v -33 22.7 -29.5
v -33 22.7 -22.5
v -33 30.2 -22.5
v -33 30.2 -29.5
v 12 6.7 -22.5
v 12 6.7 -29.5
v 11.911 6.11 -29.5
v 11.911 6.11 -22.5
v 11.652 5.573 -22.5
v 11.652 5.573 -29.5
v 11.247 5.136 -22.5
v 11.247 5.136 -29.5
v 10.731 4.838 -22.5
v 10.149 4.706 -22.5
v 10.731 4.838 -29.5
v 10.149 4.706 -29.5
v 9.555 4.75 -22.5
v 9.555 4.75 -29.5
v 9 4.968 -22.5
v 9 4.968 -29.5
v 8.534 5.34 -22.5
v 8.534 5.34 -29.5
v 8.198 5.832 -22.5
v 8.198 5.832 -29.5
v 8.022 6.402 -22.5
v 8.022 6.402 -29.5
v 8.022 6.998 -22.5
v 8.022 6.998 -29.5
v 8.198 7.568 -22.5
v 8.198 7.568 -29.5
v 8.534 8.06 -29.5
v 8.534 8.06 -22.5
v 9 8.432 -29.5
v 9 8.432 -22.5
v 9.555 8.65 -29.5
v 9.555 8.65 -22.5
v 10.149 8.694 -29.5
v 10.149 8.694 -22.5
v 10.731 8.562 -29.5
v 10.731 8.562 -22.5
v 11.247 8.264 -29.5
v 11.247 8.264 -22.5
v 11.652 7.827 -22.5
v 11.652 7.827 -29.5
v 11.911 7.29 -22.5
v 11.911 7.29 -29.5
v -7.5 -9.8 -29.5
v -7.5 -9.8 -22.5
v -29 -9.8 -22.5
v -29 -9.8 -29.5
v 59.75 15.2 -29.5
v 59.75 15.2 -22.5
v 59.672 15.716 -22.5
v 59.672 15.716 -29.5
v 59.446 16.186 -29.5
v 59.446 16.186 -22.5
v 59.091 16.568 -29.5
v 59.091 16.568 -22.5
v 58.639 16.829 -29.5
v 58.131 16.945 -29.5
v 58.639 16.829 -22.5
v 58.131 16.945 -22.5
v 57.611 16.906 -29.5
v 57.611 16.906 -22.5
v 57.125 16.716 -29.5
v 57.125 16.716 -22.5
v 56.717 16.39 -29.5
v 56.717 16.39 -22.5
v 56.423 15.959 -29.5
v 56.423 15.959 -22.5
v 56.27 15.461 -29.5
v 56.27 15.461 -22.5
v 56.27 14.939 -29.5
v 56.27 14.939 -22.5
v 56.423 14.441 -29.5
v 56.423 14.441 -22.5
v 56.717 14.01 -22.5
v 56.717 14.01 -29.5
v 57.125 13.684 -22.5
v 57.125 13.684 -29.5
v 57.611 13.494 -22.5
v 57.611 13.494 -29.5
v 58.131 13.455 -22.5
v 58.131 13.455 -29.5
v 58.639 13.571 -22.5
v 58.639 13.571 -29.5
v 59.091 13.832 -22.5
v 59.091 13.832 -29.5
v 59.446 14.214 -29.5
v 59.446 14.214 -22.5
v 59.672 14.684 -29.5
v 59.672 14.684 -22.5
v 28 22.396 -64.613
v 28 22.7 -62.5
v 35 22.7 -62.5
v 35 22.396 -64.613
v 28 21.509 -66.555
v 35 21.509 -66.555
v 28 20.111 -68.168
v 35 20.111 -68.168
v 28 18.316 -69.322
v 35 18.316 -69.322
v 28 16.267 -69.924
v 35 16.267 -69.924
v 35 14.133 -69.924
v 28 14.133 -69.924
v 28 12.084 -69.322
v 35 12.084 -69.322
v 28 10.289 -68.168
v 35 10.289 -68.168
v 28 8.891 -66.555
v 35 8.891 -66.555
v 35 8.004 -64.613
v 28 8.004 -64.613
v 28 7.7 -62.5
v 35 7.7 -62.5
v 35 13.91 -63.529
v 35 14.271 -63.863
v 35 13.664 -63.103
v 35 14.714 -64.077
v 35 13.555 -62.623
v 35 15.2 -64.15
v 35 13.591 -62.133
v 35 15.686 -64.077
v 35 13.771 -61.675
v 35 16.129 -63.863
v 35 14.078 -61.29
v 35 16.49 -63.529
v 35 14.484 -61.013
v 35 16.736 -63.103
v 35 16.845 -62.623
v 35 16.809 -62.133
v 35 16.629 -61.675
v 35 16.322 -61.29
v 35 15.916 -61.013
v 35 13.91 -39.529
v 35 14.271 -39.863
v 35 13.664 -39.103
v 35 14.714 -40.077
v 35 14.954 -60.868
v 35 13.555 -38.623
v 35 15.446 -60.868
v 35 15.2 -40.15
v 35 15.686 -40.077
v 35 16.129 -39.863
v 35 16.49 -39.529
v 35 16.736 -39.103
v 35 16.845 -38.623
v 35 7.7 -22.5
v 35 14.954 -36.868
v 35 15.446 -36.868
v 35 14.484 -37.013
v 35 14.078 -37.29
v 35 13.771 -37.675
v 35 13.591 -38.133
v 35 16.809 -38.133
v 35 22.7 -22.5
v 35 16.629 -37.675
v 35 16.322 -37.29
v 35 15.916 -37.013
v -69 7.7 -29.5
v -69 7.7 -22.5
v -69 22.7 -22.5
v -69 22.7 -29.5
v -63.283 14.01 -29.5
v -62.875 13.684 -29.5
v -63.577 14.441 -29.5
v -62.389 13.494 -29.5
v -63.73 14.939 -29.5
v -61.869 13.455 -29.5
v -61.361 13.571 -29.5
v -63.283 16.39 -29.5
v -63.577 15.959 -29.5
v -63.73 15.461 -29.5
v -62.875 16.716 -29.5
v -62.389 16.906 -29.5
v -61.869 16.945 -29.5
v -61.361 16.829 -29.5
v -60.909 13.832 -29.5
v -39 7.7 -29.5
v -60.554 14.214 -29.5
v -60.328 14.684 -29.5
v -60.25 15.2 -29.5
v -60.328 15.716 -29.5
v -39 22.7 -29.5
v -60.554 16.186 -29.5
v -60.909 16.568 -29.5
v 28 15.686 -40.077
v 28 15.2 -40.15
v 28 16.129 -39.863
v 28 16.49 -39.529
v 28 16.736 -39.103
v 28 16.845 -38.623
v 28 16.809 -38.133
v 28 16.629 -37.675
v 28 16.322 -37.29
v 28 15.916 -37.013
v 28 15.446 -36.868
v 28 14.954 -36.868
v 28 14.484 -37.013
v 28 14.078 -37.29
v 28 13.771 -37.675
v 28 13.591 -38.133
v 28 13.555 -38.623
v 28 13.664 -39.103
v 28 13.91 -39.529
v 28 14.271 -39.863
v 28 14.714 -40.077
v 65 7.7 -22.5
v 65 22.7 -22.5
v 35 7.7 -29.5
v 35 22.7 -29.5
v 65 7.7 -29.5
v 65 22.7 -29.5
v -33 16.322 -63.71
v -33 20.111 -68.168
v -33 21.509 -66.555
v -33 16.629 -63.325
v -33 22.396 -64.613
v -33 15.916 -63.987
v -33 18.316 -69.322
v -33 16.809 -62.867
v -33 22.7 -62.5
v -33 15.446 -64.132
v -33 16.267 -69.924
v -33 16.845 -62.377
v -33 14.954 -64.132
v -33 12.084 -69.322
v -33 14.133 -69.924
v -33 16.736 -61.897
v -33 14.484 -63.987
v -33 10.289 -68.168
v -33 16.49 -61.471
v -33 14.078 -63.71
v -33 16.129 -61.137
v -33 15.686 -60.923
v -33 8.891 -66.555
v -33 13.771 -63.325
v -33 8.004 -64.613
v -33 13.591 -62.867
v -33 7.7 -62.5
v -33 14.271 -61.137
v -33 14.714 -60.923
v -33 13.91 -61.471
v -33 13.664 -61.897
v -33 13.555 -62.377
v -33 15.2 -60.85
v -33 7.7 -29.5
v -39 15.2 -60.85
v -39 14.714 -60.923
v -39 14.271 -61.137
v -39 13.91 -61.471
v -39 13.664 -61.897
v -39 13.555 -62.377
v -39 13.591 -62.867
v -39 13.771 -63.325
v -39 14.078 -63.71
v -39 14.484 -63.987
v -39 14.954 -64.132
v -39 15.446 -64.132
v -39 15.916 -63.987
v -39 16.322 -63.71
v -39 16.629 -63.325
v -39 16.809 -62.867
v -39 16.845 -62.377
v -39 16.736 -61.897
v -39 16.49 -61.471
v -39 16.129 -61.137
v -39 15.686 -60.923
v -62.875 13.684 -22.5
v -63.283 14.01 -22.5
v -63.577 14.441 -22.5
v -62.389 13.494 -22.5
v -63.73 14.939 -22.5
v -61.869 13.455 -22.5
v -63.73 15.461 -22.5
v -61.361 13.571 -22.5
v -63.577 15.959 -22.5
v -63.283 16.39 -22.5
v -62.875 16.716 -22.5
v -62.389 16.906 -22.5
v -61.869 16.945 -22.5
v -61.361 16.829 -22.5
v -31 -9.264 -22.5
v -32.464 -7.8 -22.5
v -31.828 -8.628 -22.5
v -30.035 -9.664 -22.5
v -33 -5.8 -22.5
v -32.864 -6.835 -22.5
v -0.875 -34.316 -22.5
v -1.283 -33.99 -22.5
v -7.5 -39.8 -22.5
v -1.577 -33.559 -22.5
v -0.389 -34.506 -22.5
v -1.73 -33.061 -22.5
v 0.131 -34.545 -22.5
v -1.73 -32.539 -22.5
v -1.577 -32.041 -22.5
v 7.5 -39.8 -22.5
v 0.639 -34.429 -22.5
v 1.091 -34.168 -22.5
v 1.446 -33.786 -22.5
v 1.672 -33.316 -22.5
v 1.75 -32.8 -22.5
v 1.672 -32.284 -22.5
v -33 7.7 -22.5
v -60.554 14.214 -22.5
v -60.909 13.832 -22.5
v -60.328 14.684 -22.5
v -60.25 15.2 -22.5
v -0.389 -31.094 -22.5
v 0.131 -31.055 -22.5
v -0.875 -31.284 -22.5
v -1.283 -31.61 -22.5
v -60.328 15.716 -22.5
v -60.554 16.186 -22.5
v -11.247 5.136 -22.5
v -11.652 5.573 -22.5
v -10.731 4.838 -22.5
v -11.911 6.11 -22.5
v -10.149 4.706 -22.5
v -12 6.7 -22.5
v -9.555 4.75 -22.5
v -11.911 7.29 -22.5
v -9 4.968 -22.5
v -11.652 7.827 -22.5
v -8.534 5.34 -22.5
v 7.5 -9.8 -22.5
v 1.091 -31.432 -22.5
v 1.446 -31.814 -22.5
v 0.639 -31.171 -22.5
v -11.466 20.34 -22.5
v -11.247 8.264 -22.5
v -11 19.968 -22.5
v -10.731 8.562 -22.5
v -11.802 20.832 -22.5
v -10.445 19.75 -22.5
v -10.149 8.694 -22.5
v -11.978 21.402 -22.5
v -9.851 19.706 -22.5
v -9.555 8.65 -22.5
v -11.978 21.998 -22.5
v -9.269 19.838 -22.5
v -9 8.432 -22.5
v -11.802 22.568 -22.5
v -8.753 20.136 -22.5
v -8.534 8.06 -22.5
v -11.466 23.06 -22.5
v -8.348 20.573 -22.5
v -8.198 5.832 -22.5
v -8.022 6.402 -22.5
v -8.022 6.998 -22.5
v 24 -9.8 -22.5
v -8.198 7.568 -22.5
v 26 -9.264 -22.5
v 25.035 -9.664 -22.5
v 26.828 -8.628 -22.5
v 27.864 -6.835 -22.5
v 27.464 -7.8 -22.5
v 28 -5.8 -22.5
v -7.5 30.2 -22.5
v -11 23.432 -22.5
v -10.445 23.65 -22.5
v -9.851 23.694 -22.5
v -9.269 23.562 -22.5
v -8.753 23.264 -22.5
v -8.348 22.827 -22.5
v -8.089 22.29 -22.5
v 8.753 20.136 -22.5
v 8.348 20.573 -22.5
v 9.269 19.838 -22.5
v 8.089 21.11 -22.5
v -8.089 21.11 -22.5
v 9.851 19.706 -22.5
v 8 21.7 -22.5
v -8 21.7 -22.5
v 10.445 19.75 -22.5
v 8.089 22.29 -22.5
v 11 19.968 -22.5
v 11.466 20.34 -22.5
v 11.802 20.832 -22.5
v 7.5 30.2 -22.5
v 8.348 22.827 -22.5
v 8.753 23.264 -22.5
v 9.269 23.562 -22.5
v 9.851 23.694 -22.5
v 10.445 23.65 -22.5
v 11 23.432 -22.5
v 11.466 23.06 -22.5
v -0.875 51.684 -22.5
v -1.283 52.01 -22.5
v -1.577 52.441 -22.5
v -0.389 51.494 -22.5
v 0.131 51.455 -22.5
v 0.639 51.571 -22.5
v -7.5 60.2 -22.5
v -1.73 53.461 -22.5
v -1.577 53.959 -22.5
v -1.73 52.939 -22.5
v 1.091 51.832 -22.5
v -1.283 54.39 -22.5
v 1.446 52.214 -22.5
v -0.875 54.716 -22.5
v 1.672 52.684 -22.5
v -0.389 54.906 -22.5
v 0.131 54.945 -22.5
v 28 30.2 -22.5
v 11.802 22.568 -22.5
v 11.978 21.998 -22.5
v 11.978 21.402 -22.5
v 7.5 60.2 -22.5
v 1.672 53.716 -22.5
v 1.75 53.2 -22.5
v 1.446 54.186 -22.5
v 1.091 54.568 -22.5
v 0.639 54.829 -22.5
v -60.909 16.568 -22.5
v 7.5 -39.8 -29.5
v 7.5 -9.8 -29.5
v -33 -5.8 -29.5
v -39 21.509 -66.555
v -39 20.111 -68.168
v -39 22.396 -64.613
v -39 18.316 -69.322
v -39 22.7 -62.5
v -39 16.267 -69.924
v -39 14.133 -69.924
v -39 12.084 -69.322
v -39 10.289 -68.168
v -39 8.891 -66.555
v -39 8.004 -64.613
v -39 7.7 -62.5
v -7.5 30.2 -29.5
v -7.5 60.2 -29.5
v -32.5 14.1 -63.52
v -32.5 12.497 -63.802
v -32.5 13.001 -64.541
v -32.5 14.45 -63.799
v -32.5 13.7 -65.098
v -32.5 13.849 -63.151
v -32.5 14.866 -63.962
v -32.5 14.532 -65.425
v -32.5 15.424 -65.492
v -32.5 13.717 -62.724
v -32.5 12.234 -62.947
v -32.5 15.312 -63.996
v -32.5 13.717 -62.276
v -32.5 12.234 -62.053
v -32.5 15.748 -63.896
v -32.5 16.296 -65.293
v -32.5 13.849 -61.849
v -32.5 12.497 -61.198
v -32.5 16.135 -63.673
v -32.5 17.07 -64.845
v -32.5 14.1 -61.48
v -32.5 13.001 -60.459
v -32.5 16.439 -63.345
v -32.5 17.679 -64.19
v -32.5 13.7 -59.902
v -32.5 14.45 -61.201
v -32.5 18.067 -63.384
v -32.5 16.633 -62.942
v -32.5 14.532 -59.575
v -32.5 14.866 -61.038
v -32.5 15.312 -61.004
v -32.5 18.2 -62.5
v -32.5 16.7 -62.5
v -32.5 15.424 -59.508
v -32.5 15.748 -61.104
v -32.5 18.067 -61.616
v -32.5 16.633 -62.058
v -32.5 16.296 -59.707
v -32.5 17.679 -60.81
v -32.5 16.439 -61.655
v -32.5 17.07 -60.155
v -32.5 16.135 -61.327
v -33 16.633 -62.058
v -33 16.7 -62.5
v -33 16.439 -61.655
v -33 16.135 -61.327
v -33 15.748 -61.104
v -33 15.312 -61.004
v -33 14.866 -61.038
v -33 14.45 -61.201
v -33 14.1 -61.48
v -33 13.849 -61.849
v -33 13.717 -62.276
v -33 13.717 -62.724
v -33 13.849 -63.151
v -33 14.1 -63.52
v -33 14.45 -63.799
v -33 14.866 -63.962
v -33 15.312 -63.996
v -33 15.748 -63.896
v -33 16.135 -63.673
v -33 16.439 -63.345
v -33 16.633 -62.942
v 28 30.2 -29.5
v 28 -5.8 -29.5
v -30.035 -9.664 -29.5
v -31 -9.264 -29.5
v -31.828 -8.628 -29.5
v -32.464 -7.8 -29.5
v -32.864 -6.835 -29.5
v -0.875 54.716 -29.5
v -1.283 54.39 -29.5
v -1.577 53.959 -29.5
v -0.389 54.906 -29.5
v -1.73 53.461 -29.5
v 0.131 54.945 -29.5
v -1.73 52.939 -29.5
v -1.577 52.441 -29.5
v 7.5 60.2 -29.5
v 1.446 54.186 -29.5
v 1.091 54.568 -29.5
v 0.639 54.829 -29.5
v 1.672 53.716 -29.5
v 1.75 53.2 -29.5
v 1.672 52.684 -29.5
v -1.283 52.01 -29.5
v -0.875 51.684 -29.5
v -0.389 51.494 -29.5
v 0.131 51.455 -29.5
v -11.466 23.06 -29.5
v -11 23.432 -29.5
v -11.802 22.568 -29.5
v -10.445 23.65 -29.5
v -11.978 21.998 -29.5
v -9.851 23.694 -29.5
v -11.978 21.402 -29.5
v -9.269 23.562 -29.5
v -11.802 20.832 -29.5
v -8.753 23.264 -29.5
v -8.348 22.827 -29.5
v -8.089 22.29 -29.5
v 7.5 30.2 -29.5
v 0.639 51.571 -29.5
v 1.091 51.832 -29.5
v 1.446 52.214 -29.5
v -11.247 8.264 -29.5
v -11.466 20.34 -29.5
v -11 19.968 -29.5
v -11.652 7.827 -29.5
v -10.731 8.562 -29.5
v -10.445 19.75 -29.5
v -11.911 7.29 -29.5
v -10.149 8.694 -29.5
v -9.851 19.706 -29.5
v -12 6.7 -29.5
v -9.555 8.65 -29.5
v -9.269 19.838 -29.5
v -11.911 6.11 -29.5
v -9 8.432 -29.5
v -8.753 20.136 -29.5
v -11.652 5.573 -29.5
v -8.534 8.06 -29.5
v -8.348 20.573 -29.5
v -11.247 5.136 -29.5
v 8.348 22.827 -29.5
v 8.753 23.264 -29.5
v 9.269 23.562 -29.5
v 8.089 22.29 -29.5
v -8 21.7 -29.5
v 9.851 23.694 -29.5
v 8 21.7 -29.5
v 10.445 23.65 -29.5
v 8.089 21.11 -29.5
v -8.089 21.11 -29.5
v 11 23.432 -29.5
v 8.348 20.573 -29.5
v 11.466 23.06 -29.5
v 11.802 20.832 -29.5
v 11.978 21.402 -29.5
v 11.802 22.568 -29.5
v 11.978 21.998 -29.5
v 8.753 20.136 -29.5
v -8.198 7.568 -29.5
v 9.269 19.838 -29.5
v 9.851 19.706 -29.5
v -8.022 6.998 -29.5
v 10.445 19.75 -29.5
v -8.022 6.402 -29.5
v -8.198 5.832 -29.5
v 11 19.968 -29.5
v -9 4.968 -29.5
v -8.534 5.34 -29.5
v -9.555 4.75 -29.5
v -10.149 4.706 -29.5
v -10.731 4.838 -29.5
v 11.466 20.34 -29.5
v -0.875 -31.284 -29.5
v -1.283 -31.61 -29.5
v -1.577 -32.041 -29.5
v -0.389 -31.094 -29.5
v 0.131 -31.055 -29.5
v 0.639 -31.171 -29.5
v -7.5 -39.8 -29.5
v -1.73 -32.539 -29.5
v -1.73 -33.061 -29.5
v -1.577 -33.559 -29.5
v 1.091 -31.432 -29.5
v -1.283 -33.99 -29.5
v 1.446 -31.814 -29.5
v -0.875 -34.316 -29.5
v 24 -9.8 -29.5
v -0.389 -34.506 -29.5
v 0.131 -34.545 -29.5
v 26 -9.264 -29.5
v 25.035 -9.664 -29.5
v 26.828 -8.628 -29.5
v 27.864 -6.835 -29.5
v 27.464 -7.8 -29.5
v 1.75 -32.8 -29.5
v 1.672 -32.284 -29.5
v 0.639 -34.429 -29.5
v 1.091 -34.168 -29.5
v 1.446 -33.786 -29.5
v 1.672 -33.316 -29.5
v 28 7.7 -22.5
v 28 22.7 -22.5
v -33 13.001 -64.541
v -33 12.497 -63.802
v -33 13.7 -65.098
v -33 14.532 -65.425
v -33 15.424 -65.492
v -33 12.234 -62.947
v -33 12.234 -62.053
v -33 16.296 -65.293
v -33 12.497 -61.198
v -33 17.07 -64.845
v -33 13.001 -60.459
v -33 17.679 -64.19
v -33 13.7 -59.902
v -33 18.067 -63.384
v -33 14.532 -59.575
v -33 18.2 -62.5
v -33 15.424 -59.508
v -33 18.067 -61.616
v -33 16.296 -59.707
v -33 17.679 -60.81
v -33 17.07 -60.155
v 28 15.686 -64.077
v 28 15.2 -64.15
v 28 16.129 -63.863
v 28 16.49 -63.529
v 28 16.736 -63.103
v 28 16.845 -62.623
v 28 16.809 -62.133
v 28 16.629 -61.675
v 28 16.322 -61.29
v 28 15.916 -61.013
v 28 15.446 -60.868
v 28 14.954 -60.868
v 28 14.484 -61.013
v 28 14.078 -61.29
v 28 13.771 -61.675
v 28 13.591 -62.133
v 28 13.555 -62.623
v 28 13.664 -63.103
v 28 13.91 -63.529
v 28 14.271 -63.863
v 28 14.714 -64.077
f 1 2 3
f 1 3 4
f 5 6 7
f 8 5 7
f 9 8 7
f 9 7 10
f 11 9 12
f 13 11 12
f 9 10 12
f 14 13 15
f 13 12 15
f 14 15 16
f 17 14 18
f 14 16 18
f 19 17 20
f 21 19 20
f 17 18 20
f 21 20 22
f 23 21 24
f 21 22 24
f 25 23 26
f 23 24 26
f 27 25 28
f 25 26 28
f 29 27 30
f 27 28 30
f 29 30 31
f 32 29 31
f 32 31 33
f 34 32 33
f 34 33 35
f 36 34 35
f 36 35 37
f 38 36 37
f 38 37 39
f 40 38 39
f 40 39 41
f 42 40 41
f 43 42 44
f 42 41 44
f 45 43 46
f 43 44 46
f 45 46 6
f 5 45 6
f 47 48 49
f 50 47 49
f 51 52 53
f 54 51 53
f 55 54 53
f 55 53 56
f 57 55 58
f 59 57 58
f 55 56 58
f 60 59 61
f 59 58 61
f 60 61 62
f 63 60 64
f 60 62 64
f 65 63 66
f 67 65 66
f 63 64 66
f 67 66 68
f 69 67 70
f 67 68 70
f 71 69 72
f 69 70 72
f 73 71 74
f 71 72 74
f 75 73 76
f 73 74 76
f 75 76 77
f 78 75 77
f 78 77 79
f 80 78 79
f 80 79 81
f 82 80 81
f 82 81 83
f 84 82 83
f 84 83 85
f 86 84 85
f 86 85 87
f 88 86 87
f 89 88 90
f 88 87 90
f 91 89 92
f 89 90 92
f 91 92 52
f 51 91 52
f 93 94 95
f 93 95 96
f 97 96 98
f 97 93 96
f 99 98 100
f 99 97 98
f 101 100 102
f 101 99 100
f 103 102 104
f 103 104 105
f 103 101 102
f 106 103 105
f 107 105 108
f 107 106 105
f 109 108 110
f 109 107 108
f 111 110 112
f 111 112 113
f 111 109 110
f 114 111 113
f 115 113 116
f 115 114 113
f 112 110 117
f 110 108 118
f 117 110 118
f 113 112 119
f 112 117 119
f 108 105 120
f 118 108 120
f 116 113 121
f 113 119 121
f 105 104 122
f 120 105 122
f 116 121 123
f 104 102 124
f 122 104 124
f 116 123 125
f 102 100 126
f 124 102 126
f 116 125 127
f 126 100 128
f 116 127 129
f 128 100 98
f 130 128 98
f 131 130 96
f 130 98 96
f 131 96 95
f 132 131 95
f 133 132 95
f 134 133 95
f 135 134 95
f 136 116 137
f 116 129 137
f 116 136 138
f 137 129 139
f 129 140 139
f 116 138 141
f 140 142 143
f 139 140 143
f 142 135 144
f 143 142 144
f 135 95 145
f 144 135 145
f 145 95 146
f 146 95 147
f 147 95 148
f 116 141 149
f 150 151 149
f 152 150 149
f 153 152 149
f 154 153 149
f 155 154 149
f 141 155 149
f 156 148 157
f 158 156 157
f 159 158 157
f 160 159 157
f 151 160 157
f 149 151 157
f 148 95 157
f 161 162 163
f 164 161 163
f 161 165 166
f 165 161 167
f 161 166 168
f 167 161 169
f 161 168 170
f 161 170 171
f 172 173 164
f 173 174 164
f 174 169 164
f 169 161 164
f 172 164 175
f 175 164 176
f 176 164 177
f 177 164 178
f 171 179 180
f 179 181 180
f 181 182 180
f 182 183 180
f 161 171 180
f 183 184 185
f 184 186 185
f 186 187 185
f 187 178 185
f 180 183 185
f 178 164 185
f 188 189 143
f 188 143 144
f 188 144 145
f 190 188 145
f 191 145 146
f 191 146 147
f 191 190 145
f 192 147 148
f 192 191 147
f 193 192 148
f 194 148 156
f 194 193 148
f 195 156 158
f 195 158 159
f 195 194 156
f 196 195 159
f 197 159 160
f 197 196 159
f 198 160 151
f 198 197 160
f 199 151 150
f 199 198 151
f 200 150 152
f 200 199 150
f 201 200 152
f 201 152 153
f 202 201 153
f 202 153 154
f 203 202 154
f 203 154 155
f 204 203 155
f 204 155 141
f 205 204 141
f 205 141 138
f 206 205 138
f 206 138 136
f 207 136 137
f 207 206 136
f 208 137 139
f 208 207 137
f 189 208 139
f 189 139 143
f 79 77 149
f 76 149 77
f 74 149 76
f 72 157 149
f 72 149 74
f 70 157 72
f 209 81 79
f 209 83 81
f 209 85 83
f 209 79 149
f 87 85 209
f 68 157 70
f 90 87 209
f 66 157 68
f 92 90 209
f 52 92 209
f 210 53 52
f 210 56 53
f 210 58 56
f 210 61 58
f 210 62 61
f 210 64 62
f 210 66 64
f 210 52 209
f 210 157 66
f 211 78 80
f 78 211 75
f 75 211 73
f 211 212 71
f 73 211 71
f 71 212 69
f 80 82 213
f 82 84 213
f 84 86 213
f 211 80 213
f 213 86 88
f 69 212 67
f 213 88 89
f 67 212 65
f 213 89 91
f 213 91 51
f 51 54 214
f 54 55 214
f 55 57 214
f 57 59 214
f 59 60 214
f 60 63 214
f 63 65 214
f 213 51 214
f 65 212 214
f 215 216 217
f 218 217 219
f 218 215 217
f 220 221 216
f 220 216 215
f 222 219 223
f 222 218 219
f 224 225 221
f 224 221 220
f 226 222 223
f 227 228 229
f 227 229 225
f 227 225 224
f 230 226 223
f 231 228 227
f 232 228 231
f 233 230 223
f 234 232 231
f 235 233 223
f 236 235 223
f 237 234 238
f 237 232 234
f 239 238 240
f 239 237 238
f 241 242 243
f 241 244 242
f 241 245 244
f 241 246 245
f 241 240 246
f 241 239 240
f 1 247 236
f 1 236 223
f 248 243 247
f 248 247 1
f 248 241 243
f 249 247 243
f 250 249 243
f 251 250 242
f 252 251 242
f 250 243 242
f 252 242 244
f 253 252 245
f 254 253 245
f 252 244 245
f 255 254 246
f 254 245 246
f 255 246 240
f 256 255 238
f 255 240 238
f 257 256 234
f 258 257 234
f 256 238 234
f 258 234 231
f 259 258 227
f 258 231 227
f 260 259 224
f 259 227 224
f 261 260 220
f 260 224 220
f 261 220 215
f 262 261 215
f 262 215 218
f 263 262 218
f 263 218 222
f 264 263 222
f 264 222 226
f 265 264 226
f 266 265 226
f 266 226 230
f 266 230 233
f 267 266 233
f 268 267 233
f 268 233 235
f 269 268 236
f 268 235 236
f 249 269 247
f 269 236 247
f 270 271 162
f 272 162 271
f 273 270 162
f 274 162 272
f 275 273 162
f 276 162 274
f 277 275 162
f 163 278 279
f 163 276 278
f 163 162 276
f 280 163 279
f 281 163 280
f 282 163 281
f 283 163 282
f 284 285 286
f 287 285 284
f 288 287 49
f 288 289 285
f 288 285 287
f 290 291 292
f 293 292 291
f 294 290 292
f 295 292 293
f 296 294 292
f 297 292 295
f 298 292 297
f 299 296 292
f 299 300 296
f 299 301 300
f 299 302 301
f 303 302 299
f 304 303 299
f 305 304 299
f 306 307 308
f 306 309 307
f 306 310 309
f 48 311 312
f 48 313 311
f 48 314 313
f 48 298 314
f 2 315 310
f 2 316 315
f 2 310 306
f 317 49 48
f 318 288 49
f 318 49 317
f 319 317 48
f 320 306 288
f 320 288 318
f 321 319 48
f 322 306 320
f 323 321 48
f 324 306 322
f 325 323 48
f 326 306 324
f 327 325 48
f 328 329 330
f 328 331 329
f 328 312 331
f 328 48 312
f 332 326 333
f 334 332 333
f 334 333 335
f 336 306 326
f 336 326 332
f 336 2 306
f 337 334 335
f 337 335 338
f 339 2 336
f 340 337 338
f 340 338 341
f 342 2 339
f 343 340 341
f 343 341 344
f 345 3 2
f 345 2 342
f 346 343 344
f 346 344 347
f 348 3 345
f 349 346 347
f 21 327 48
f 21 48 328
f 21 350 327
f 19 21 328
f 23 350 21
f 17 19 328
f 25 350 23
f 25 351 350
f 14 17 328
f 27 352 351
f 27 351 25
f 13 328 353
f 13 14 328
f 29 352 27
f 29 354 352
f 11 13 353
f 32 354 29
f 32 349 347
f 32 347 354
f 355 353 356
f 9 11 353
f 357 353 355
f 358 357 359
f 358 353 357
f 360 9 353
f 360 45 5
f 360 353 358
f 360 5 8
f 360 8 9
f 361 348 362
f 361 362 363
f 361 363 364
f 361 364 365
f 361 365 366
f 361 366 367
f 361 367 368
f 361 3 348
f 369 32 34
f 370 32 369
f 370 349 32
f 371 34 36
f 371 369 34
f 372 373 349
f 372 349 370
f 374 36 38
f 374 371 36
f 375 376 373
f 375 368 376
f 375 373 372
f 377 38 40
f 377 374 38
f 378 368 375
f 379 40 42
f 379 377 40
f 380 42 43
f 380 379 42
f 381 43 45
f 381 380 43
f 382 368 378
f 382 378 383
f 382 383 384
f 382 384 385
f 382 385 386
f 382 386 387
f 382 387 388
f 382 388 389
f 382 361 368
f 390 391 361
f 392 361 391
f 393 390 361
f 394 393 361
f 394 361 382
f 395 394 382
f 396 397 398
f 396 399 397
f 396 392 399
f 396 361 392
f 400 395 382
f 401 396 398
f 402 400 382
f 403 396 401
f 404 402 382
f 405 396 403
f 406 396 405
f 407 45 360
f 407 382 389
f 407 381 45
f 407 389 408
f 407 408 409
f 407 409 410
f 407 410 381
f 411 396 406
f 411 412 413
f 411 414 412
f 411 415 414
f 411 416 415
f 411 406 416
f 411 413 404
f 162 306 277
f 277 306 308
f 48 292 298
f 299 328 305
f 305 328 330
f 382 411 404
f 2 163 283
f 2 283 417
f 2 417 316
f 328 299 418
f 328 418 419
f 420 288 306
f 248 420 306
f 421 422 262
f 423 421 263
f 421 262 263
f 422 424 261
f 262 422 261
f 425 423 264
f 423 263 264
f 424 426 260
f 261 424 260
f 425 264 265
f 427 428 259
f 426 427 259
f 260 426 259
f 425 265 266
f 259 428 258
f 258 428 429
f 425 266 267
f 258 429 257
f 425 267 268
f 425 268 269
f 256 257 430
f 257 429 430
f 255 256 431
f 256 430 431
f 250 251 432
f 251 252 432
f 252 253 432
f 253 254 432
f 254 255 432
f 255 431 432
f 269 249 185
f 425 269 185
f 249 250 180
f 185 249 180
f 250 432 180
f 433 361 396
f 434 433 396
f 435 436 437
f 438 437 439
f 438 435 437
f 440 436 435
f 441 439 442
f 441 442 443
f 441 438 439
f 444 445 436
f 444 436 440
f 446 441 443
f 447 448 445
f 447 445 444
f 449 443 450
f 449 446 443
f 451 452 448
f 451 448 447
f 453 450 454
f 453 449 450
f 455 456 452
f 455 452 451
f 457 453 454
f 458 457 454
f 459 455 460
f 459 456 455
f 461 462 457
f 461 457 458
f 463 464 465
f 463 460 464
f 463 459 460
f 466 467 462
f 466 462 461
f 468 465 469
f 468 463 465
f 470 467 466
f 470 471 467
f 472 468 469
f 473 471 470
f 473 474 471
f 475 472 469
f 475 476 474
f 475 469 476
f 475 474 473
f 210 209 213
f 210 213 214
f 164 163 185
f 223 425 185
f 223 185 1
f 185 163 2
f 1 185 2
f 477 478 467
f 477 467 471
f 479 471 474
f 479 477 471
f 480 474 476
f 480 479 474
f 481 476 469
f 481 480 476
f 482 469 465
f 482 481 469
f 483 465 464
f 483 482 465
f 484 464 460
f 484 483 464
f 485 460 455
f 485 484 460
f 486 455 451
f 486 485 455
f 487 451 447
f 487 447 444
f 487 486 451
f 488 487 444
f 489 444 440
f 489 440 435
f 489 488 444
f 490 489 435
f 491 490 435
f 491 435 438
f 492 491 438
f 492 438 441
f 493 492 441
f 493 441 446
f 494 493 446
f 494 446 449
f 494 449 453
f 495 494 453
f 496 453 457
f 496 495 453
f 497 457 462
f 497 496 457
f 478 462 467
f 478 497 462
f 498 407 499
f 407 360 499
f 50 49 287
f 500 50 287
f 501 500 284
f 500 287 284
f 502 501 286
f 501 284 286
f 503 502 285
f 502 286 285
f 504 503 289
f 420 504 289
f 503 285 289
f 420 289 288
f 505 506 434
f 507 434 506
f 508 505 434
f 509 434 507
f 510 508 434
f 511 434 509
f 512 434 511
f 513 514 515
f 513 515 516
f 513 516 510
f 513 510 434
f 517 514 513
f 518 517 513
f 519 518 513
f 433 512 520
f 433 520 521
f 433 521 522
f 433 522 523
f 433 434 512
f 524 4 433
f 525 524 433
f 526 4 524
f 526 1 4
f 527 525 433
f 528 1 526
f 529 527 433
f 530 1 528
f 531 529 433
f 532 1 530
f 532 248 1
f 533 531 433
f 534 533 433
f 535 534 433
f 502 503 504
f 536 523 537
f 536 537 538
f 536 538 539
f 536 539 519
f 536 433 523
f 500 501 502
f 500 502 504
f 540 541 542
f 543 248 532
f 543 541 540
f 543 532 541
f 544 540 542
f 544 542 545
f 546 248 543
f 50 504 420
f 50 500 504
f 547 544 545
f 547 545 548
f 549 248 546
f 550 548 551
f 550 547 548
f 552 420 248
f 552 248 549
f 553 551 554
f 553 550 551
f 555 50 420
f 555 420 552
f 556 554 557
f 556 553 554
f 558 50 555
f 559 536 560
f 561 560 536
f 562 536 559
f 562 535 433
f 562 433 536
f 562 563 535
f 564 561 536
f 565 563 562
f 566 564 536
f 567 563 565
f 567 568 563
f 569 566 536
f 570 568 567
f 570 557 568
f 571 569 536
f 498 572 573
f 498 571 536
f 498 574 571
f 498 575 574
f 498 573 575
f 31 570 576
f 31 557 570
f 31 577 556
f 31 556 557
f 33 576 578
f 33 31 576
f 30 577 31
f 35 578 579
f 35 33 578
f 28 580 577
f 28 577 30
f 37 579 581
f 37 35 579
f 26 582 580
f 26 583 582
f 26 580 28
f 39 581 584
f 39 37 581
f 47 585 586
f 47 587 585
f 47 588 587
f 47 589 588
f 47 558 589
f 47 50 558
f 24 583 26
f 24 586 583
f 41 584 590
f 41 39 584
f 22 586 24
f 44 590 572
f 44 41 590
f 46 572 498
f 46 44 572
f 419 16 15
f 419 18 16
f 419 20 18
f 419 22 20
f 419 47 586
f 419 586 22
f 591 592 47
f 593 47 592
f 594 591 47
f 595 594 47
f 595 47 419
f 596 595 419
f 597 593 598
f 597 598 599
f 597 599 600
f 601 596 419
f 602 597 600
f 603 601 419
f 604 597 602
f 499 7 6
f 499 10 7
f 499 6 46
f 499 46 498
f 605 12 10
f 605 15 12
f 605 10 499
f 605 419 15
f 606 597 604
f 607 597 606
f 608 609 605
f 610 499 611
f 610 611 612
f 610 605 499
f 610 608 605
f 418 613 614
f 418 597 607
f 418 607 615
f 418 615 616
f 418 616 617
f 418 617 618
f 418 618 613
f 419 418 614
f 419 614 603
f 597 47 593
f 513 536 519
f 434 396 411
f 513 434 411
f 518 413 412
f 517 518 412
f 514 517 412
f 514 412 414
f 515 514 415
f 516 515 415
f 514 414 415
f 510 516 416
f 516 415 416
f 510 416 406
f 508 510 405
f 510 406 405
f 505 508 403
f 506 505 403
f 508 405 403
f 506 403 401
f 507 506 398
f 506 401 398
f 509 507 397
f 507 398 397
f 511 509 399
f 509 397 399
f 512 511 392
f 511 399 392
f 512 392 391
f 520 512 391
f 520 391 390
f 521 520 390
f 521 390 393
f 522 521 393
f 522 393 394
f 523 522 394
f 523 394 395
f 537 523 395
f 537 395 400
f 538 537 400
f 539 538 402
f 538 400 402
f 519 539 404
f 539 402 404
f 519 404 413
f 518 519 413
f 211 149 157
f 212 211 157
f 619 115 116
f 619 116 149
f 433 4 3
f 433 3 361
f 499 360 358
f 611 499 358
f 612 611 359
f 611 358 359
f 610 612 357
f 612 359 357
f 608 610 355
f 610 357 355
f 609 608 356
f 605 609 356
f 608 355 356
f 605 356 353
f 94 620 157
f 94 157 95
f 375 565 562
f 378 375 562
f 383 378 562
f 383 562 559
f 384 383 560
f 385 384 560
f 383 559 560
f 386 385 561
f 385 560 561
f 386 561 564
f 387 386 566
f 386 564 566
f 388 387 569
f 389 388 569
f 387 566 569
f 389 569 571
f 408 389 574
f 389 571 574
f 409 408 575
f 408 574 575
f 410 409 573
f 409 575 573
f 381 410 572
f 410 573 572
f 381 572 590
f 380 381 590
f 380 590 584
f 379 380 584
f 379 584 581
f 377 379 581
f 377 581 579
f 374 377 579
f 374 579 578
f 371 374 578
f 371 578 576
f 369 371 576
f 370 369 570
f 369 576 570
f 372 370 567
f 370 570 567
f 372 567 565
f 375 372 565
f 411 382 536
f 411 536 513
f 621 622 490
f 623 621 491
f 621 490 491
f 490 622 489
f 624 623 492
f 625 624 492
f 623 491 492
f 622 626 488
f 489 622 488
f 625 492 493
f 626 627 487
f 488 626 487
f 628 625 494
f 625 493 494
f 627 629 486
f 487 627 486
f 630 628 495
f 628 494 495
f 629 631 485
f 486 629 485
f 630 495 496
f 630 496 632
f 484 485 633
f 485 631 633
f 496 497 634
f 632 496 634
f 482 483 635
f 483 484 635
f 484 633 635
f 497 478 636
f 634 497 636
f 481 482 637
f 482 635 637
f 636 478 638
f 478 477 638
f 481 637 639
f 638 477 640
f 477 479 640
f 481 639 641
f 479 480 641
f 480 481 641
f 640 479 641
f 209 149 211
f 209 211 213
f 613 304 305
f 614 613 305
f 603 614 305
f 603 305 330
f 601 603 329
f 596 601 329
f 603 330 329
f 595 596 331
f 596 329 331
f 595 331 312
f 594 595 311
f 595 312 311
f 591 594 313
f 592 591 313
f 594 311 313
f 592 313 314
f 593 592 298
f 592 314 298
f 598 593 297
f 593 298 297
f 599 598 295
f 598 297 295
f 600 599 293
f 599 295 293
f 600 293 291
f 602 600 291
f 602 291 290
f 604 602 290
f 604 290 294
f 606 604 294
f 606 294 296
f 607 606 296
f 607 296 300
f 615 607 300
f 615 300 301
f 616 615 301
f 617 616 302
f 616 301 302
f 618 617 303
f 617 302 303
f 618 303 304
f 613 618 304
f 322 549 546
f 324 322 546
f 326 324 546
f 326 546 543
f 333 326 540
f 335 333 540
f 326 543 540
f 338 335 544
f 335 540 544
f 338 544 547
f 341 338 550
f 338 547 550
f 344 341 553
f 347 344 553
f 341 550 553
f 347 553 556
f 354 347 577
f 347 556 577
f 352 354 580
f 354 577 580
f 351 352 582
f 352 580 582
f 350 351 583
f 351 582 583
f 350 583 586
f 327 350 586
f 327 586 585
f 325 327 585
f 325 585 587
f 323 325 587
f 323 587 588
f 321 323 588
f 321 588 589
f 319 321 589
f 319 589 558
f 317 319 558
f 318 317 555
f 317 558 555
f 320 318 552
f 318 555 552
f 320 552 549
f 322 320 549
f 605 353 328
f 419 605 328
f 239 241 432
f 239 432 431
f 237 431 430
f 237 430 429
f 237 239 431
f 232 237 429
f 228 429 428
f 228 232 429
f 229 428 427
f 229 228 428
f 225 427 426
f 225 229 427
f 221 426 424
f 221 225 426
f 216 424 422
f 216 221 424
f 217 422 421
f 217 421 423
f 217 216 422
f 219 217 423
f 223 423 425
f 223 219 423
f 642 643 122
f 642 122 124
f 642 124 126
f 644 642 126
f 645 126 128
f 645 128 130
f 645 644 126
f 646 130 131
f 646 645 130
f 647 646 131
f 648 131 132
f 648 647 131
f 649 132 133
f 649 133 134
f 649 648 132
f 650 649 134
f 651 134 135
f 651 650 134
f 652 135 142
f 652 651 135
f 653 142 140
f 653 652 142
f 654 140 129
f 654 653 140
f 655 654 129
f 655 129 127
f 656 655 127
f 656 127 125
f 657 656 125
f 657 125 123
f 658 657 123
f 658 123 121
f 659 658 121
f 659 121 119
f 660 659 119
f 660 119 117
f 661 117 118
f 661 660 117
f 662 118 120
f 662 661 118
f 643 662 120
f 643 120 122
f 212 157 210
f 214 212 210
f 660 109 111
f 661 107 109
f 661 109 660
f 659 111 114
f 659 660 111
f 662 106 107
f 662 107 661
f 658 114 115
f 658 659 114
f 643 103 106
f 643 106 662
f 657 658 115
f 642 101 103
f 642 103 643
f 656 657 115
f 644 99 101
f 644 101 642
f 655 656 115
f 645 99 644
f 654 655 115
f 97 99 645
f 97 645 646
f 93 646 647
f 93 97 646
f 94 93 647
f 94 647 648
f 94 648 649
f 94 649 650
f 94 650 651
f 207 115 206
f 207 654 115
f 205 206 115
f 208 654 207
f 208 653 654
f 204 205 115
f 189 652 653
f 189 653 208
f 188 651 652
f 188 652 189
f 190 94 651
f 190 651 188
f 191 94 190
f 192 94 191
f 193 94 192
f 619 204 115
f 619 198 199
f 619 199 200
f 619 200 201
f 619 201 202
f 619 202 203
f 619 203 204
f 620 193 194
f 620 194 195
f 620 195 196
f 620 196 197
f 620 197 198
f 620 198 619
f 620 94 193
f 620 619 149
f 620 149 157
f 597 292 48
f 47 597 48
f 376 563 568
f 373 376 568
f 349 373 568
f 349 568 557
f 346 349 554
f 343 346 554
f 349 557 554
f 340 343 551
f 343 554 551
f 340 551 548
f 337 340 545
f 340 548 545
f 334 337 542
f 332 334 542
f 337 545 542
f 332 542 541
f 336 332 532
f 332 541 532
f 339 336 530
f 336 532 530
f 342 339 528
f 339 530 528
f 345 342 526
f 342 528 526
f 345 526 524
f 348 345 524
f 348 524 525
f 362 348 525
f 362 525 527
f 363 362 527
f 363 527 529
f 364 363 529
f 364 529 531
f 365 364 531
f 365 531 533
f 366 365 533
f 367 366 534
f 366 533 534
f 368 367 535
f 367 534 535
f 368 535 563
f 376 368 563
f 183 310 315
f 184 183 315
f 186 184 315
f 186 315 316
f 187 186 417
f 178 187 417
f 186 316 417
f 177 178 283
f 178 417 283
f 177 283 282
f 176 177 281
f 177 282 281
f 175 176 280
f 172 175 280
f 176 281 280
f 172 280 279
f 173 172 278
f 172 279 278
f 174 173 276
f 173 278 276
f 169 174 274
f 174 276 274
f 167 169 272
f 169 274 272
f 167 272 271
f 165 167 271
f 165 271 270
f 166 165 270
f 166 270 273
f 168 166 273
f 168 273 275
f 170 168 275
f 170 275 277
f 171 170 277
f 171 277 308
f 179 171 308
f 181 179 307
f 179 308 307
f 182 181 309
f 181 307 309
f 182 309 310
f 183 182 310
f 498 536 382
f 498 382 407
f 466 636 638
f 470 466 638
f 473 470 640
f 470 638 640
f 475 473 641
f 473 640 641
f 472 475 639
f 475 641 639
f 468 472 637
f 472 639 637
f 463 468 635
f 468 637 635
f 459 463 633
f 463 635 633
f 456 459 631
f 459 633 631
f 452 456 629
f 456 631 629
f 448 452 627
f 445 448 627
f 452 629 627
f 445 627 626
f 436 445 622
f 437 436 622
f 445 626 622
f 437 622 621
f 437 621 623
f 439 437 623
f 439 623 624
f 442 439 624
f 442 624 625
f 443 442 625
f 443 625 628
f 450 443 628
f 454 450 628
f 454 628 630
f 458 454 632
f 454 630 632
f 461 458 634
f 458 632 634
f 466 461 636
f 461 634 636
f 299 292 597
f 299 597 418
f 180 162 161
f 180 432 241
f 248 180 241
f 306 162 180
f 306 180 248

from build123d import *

# Parameters (mm, degrees)
EXTRUDE_START       = 24.2
SKETCH_4_W          = 61
SKETCH_4_H          = 7
EXTRUDE_1_DEPTH     = 6
SKETCH_5_W          = 40
SKETCH_5_H          = 34
SKETCH_5_R          = 2
EXTRUDE_2_DEPTH     = 7
EXTRUDE_START_2     = -9.8
SKETCH_7_R          = 4.1
EXTRUDE_3_DEPTH     = 7
EXTRUDE_START_3     = -55
SKETCH_9_R          = 1.65
EXTRUDE_4_DEPTH     = 6
EXTRUDE_START_4     = -22.5
EXTRUDE_5_DEPTH     = 7
EXTRUDE_START_5     = 28
SKETCH_14_R         = 1.65
EXTRUDE_8_DEPTH     = 7
SKETCH_17_R         = 3
SKETCH_17_R_2       = 1.5
EXTRUDE_11_DEPTH    = 0.5
SKETCH_21_W         = 15
SKETCH_21_H         = 30
SKETCH_21_R         = 1.75
SKETCH_21_W_2       = 30
SKETCH_21_H_2       = 15
EXTRUDE_12_DEPTH    = 7
SKETCH_22_W         = 40
SKETCH_22_H         = 7
CUT_EXTRUDE_1_DEPTH = 23


with BuildPart() as part:
    # 草图4 → 凸台-拉伸1 (new body)
    with BuildSketch(Plane(origin=(0, 0, 0), x_dir=(1, 0, 0), z_dir=(0, 1, 0)).offset(EXTRUDE_START)):
        with Locations((-2.5, 26)):
            Rectangle(SKETCH_4_W, SKETCH_4_H)
    extrude(amount=EXTRUDE_1_DEPTH)

    # 草图5 → 凸台-拉伸2 (add)
    with BuildSketch(Plane(origin=(0, 0, -29.5), x_dir=(-1, 0, 0), z_dir=(0, 0, -1))):
        with Locations((0, 7.2)):
            Rectangle(SKETCH_5_W, SKETCH_5_H)
        with Locations((-10, 21.7)):
            Circle(SKETCH_5_R, mode=Mode.SUBTRACT)
        with Locations(Location((10, 21.7, 0), (0, 0, 180))):
            Circle(SKETCH_5_R, mode=Mode.SUBTRACT)
        with Locations((10, 6.7)):
            Circle(SKETCH_5_R, mode=Mode.SUBTRACT)
        with Locations(Location((-10, 6.7, 0), (0, 0, 180))):
            Circle(SKETCH_5_R, mode=Mode.SUBTRACT)
    extrude(amount=-EXTRUDE_2_DEPTH)

    # 草图7 → 凸台-拉伸3 (add)
    with BuildSketch(Plane(origin=(0, 0, 0), x_dir=(1, 0, 0), z_dir=(0, 1, 0)).offset(EXTRUDE_START_2)):
        with BuildLine():
            Line((20, 22.5), (-20, 22.5))
            Line((-20, 22.5), (-20, 2.5))
            ThreePointArc((-20, 2.5), (-19.121320344, 0.378679656), (-17, -0.5))
            Line((-17, -0.5), (17, -0.5))
            ThreePointArc((17, -0.5), (19.121320344, 0.378679656), (20, 2.5))
            Line((20, 2.5), (20, 22.5))
        make_face()
        with Locations(Location((10, 10, 0), (0, 0, 90))):
            Circle(SKETCH_7_R, mode=Mode.SUBTRACT)
    extrude(amount=EXTRUDE_3_DEPTH)



with BuildPart() as body_2:
    # 草图9 → 凸台-拉伸4 (new body)
    with BuildSketch(Plane(origin=(22, 25.2, -43.868265324), x_dir=(0, 0, 1), z_dir=(1, 0, 0)).offset(EXTRUDE_START_3)):
        with BuildLine():
            Line((-18.631734676, 2.5), (21.368265324, 2.5))
            Line((21.368265324, 2.5), (21.368265324, 17.5))
            Line((21.368265324, 17.5), (-18.631734676, 17.5))
            ThreePointArc((-18.631734676, 17.5), (-26.131734676, 10), (-18.631734676, 2.5))
        make_face()
        with Locations((-18.631734676, 10)):
            Circle(SKETCH_9_R, mode=Mode.SUBTRACT)
    extrude(amount=-EXTRUDE_4_DEPTH)


with BuildPart() as part_1:
    add(part.part)

    add(body_2.part)  # 凸台-拉伸5 merges body 2
    # 草图10 → 凸台-拉伸5 (add)
    with BuildSketch(Plane.XY.offset(EXTRUDE_START_4)):
        with BuildLine():
            Line((-33, 30.2), (-20, 30.2))
            Line((-20, 30.2), (-20, -9.8))
            Line((-20, -9.8), (-29, -9.8))
            ThreePointArc((-29, -9.8), (-31.828427125, -8.628427125), (-33, -5.8))
            Line((-33, -5.8), (-33, 30.2))
        make_face()
    extrude(amount=-EXTRUDE_5_DEPTH)

    # 草图21 → 凸台-拉伸12 (add)
    # profile 1 of 5: a face of its own
    with BuildSketch(Plane.XY.offset(EXTRUDE_START_4)):
        with Locations((0, 45.2)):
            Rectangle(SKETCH_21_W, SKETCH_21_H)
        with Locations((0, 53.2)):
            Circle(SKETCH_21_R, mode=Mode.SUBTRACT)
    # profile 2 of 5: a face of its own
    with BuildSketch(Plane.XY.offset(EXTRUDE_START_4)):
        with Locations((-54, 15.2)):
            Rectangle(SKETCH_21_W_2, SKETCH_21_H_2)
        with Locations((-62, 15.2)):
            Circle(SKETCH_21_R, mode=Mode.SUBTRACT)
    # profile 3 of 5: a face of its own
    with BuildSketch(Plane.XY.offset(EXTRUDE_START_4)):
        with Locations((50, 15.2)):
            Rectangle(SKETCH_21_W_2, SKETCH_21_H_2)
        with Locations((58, 15.2)):
            Circle(SKETCH_21_R, mode=Mode.SUBTRACT)
    # profile 4 of 5: a face of its own
    with BuildSketch(Plane.XY.offset(EXTRUDE_START_4)):
        with Locations((0, -24.8)):
            Rectangle(SKETCH_21_W, SKETCH_21_H)
        with Locations((0, -32.8)):
            Circle(SKETCH_21_R, mode=Mode.SUBTRACT)
    # profile 5 of 5: a face of its own
    with BuildSketch(Plane.XY.offset(EXTRUDE_START_4)):
        with BuildLine():
            Line((20, -9.8), (20, 24.2))
            Line((20, 24.2), (28, 24.2))
            Line((28, 24.2), (28, -5.8))
            ThreePointArc((28, -5.8), (26.828427125, -8.628427125), (24, -9.8))
            Line((24, -9.8), (20, -9.8))
        make_face()
    extrude(amount=-EXTRUDE_12_DEPTH)


with BuildPart() as body_2_2:
    # 草图14 → 凸台-拉伸8 (new body)
    with BuildSketch(Plane(origin=(0, 0, 0), x_dir=(0, 0, -1), z_dir=(1, 0, 0)).offset(EXTRUDE_START_5)):
        with BuildLine():
            Line((22.5, 22.7), (62.5, 22.7))
            ThreePointArc((62.5, 22.7), (70, 15.2), (62.5, 7.7))
            Line((62.5, 7.7), (22.5, 7.7))
            Line((22.5, 7.7), (22.5, 22.7))
        make_face()
        with Locations((38.5, 15.2)):
            Circle(SKETCH_14_R, mode=Mode.SUBTRACT)
        with Locations((62.5, 15.2)):
            Circle(SKETCH_14_R, mode=Mode.SUBTRACT)
    extrude(amount=EXTRUDE_8_DEPTH)


with BuildPart() as body_3:
    # 草图17 → 凸台-拉伸11 (new body)
    with BuildSketch(Plane(origin=(-33, 0, 0), x_dir=(0, 0, -1), z_dir=(1, 0, 0))):
        with Locations(Location((62.5, 15.2, 0), (0, 0, 90))):
            Circle(SKETCH_17_R)
        with Locations(Location((62.5, 15.2, 0), (0, 0, 90))):
            Circle(SKETCH_17_R_2, mode=Mode.SUBTRACT)
    extrude(amount=EXTRUDE_11_DEPTH)


with BuildPart() as extrude_12_piece_1:
    # of the separate pieces the step leaves, piece 1, a body of its own (extrude_12_pieces)
    add(part_1.part.solids().sort_by_distance((28, 30.2, -22.5))[0])

    # 草图22 → 切除-拉伸1 (cut)
    with BuildSketch(Plane.XY.offset(-22.5)):
        with Locations((0, -6.3)):
            Rectangle(SKETCH_22_W, SKETCH_22_H)
    extrude(amount=CUT_EXTRUDE_1_DEPTH, mode=Mode.SUBTRACT)


with BuildPart() as extrude_12_piece_2:
    # of the separate pieces the step leaves, piece 2, a body of its own (extrude_12_pieces)
    add(part_1.part.solids().sort_by_distance((35, 22.7, -22.5))[0])


solid = Compound([body_2_2.part, body_3.part, extrude_12_piece_1.part, extrude_12_piece_2.part])
